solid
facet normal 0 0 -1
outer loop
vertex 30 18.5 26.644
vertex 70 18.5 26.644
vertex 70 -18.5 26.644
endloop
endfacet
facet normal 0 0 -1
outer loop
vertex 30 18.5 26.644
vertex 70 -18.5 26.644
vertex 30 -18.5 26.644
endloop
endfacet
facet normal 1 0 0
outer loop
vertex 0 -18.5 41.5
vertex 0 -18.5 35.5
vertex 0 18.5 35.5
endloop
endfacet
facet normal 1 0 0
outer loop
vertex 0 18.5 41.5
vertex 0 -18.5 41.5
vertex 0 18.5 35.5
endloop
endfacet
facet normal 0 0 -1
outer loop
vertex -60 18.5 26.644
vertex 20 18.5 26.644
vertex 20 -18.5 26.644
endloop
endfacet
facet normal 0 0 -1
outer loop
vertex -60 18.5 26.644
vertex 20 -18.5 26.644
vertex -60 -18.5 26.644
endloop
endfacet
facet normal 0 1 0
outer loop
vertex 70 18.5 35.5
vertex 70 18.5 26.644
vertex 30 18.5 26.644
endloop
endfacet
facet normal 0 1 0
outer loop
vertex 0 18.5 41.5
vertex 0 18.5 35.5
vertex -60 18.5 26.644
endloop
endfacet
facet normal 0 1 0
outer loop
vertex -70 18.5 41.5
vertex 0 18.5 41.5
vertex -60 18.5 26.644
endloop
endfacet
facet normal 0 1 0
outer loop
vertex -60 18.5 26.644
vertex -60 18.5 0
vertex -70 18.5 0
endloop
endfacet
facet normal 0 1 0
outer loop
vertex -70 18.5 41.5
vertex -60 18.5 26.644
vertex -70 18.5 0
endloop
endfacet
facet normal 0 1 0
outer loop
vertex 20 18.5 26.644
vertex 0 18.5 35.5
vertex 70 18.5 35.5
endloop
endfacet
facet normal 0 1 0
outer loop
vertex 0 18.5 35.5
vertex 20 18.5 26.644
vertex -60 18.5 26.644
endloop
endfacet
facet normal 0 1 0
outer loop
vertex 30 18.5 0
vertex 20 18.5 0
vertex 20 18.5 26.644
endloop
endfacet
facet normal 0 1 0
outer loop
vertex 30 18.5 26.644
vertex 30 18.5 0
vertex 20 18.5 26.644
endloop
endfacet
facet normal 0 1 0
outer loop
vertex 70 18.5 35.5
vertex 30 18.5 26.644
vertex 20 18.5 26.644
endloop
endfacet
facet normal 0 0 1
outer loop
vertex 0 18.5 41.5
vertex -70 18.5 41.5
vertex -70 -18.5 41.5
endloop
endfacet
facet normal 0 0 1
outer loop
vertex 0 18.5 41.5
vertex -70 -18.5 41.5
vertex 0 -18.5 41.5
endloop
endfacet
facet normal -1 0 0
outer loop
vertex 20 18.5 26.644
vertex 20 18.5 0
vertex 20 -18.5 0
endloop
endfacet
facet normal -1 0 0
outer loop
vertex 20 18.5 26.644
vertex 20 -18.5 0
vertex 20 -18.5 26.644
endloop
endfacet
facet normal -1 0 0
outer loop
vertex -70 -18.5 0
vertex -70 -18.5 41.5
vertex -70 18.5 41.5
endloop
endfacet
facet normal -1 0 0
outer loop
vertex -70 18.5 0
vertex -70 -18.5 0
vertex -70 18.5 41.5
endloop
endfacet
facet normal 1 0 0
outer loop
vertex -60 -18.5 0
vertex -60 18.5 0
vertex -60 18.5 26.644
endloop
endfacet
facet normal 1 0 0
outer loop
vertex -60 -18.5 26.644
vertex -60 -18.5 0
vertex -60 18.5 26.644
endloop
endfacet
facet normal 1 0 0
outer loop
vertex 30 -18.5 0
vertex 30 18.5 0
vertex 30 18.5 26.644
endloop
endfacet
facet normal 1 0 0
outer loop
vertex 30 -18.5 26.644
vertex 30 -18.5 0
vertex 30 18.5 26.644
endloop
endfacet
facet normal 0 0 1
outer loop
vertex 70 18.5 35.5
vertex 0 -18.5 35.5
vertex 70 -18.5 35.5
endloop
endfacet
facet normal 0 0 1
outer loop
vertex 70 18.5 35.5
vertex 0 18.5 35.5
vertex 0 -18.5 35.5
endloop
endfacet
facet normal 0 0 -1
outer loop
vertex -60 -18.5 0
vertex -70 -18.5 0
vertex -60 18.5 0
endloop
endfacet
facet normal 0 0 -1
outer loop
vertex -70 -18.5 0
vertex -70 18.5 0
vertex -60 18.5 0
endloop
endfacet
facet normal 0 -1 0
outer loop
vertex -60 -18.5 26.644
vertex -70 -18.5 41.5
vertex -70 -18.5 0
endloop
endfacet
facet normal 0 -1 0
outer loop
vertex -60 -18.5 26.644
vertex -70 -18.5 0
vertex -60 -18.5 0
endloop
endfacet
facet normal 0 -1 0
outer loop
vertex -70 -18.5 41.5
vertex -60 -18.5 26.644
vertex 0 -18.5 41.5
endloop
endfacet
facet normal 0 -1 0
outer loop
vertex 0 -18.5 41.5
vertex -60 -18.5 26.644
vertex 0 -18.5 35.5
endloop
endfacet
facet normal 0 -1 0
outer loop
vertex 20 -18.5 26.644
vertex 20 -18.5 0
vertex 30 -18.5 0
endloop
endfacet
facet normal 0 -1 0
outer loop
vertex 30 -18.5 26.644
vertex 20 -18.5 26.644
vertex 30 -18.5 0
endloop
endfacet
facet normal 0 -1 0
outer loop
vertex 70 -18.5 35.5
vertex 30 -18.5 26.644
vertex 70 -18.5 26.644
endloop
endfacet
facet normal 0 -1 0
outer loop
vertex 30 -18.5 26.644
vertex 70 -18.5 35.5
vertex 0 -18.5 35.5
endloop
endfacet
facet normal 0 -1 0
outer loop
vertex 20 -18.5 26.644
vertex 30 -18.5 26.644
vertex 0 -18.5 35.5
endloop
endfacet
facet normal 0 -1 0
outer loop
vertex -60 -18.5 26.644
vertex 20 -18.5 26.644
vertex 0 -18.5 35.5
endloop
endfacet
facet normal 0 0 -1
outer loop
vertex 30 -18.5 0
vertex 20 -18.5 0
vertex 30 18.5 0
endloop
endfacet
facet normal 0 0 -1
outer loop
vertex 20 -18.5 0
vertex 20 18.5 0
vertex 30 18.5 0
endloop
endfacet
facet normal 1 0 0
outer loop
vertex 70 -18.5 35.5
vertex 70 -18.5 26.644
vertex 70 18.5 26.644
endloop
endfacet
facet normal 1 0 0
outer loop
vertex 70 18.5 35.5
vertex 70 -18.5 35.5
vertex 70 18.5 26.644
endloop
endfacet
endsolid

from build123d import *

# Parameters (mm, degrees)
F0_W     = 70
F0_H     = 37
F1_DEPTH = 41.5
F2_DEPTH = 35.5
F3_W     = 80
F3_H     = 26.6440417618
F3_W_2   = 40
F4_DEPTH = 40


with BuildPart() as f1:
    # F0 (on Top) → F1 (new body)
    with BuildSketch(Plane.XY):
        with Locations((-35, 0)):
            Rectangle(F0_W, F0_H)
    extrude(amount=F1_DEPTH)

    # F0 (on Top) → F2 (join)
    with BuildSketch(Plane.XY):
        with Locations((35, 0)):
            Rectangle(F0_W, F0_H)
        with Locations((-35, 0)):
            Rectangle(F0_W, F0_H)
    extrude(amount=F2_DEPTH)

    # F3 (on face) → F4 (cut)
    with BuildSketch(Plane(origin=(0, 18.5, 0), x_dir=(-1, 0, 0), z_dir=(0, 1, 0))):
        with Locations((20, 13.3220208809)):
            Rectangle(F3_W, F3_H)
        with Locations((-50, 13.3220208809)):
            Rectangle(F3_W_2, F3_H)
    extrude(amount=-F4_DEPTH, mode=Mode.SUBTRACT)


solid = f1.part
